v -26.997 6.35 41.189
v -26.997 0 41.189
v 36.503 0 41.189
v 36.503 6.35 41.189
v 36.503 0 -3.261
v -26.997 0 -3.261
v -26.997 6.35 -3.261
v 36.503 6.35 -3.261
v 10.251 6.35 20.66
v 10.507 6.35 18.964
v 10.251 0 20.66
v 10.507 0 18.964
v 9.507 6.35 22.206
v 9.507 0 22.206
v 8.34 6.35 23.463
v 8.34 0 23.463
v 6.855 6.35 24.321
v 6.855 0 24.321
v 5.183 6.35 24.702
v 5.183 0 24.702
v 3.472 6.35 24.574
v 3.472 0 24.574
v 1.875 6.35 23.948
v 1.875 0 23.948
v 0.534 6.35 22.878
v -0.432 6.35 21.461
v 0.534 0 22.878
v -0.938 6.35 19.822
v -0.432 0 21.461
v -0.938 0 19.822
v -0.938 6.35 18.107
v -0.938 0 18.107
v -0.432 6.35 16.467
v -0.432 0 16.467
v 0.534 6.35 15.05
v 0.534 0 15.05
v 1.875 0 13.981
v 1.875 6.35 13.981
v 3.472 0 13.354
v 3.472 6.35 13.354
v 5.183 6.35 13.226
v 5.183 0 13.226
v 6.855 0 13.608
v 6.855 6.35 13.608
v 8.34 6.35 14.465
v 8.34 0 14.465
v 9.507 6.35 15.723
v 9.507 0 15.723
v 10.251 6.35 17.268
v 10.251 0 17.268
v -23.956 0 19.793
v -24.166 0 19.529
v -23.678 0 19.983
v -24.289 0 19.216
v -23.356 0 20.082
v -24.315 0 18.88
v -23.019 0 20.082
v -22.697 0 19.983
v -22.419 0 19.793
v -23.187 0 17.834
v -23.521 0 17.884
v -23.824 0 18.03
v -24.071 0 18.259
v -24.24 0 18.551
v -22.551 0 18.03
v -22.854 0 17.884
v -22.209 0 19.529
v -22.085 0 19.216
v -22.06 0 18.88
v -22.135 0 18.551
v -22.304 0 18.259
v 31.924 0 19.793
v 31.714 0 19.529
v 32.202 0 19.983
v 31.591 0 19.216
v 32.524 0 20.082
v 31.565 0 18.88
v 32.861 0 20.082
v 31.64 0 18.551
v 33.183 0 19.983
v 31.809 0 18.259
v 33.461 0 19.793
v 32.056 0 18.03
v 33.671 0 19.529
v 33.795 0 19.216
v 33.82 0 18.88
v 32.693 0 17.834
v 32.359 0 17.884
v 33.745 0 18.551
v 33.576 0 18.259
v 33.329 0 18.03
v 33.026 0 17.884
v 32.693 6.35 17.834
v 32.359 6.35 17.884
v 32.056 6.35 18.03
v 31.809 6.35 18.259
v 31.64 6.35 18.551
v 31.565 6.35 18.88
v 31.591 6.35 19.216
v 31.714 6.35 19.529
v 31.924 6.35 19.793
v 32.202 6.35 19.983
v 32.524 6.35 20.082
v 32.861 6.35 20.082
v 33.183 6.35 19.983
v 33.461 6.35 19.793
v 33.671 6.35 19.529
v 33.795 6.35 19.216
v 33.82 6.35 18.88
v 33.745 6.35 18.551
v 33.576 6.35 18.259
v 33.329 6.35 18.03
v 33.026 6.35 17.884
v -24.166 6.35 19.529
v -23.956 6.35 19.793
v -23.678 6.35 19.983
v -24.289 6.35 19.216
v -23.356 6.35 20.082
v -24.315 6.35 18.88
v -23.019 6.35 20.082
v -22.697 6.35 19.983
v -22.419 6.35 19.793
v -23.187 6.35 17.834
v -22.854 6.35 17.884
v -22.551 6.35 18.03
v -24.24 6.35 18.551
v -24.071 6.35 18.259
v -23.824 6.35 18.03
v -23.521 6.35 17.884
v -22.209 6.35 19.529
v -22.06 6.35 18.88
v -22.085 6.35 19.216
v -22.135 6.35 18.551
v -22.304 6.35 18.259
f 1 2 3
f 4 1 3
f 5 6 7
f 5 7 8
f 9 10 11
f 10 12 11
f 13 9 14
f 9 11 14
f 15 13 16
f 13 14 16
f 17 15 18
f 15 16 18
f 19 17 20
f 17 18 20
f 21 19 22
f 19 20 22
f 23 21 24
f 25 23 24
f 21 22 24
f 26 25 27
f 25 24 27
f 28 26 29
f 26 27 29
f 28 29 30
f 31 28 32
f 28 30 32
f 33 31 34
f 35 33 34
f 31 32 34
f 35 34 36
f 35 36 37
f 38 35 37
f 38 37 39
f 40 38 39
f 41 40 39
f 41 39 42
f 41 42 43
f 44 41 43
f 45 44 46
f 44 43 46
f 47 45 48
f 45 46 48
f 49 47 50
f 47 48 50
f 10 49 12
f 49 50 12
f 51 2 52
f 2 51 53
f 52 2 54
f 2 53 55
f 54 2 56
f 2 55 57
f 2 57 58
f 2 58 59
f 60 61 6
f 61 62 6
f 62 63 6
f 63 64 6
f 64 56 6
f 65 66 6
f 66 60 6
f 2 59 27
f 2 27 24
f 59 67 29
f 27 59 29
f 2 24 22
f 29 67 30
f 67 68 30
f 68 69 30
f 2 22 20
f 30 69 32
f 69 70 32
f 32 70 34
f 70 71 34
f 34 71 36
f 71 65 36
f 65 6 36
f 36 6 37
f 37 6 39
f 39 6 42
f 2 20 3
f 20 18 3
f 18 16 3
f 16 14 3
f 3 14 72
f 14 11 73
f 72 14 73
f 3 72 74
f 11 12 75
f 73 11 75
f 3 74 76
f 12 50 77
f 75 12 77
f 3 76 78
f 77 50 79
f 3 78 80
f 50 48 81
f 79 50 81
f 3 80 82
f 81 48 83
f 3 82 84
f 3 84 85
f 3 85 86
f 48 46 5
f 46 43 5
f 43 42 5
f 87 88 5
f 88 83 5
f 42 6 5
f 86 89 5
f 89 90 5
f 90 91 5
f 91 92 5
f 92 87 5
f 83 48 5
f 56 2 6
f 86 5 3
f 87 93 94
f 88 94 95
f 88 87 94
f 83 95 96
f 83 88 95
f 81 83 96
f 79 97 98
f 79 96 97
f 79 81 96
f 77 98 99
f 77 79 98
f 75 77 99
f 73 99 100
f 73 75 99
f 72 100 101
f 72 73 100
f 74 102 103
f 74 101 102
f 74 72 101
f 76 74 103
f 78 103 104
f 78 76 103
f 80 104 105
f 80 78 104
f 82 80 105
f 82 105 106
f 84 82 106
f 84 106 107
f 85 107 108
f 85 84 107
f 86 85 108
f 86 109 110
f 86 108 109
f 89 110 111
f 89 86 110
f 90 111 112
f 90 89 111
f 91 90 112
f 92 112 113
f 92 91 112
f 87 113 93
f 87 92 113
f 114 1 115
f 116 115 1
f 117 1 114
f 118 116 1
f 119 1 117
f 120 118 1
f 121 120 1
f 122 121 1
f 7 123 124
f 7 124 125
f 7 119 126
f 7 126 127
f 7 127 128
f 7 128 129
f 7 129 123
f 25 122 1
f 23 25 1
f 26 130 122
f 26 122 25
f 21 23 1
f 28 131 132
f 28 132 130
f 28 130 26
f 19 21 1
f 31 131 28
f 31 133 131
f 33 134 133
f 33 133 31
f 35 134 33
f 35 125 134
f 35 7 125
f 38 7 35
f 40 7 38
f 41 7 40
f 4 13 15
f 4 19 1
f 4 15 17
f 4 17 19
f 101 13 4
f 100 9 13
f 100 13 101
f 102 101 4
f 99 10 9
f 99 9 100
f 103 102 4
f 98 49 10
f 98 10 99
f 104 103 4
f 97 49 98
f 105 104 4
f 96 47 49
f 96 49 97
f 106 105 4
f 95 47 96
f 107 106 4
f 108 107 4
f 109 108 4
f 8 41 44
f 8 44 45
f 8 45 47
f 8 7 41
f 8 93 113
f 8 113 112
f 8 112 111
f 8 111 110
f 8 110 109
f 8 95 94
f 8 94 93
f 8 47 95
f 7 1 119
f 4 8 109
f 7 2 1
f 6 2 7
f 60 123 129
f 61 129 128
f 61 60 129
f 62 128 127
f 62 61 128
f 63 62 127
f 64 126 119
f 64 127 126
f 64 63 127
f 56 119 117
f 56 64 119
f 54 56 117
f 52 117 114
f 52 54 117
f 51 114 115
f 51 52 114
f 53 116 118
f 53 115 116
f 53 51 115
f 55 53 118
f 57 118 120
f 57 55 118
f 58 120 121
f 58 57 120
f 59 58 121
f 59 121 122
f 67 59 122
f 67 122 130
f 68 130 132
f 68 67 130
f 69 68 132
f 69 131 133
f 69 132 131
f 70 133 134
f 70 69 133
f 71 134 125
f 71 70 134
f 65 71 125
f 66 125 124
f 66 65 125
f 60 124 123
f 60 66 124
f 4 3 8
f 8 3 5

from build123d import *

# Parameters (mm, degrees)
SKETCH1_W                       = 63.5
SKETCH1_H                       = 44.45
BOSS_EXTRUDE1_DEPTH             = 6.35
LPATTERN1_COUNT                 = 2
LPATTERN1_PITCH                 = 55.88
TAP_DRILL_FOR_1_2_20_TAP1_D     = 11.50874
TAP_DRILL_FOR_1_2_20_TAP1_DEPTH = 6.35
TAP_DRILL_FOR_1_2_20_TAP1_TIP   = 3.45757432


with BuildPart() as part:
    # Sketch1 → Boss-Extrude1 (new body)
    with BuildSketch(Plane(origin=(0, 0, 0), x_dir=(1, 0, 0), z_dir=(0, 1, 0))):
        with Locations((4.75259427, -18.964156798)):
            Rectangle(SKETCH1_W, SKETCH1_H)
    extrude(amount=BOSS_EXTRUDE1_DEPTH)

    # Sketch16 → Tap Drill for #4-40 Tap1 (revolve, cut)
    with BuildSketch(Plane(origin=(-23.18740573, 0, 18.964156798), x_dir=(0, 0, -1), z_dir=(1, 0, 0))):
        Polygon((0, 0), (0, 13.379152758), (1.1303, 12.7), (1.1303, 0), align=None)
    tap_drill_for_4_40_tap1 = revolve(axis=Axis((-23.18740573, -6.35, 18.964156798), (0, 1, 0)), mode=Mode.SUBTRACT)

    # LPattern1: Tap Drill for #4-40 Tap1 ×2
    with Locations(*[(i * LPATTERN1_PITCH, 0, 0) for i in range(1, LPATTERN1_COUNT)]):
        add(tap_drill_for_4_40_tap1, mode=Mode.SUBTRACT)

    # Tap Drill for 1/2-20 Tap1
    with Locations(Plane(origin=(0, 6.35, 0), x_dir=(-1, 0, 0), z_dir=(0, 1, 0))):
        with Locations((-4.75259427, 18.964156798)):
            Hole(TAP_DRILL_FOR_1_2_20_TAP1_D / 2, depth=TAP_DRILL_FOR_1_2_20_TAP1_DEPTH)
            with Locations((0, 0, -(TAP_DRILL_FOR_1_2_20_TAP1_DEPTH + TAP_DRILL_FOR_1_2_20_TAP1_TIP / 2))):  # 118° drill point
                Cone(0, TAP_DRILL_FOR_1_2_20_TAP1_D / 2, TAP_DRILL_FOR_1_2_20_TAP1_TIP, mode=Mode.SUBTRACT)


solid = part.part
